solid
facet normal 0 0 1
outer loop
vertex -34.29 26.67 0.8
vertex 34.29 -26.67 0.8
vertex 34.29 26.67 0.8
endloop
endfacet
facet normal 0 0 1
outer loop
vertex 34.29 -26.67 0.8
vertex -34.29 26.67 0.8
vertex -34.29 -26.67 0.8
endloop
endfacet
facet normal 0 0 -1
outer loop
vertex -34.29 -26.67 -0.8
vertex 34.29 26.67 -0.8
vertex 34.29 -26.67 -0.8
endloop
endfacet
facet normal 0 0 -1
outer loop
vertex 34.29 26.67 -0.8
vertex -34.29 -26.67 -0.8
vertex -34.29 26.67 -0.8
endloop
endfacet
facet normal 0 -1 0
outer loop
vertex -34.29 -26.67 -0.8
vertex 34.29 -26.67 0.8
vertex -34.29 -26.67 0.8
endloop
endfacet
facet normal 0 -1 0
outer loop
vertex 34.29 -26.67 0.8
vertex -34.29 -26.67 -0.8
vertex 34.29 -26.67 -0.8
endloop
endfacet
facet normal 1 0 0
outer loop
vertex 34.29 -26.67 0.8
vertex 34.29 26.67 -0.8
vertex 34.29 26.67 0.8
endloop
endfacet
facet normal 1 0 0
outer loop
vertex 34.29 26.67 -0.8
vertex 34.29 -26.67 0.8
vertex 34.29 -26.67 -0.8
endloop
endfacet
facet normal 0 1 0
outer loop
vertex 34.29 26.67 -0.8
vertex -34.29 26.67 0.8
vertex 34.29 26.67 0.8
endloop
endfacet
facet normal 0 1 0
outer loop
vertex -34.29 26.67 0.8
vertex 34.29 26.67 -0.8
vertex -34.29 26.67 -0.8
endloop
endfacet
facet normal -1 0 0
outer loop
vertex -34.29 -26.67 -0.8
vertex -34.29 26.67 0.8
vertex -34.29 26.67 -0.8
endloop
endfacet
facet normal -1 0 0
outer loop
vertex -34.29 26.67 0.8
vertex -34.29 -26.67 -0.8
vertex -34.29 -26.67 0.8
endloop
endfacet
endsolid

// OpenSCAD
// Parameters
pcb_length = 68.58; //[34.29:137.16:0.01]
pcb_width = 53.34; //[26.67:106.68:0.01]
pcb_thickness = 1.6; //[0.8:3.2:0.1]

// Main PCB Body
module pcb_main_body() {
  color([0.0, 0.4, 0.2]) // Green color for PCB
  cube([pcb_length, pcb_width, pcb_thickness], center=true);
}

// Mounting Holes (Placeholder)
module mounting_holes() {
  // No actual holes defined, placeholder for future implementation
}

// Edge Rounding (Placeholder)
module edge_rounding() {
  // No actual rounding defined, placeholder for future implementation
}

// Silkscreen Markings (Placeholder)
module silkscreen_markings() {
  // No actual markings defined, placeholder for future implementation
}

// Connectors and Headers (Placeholder)
module connectors_headers() {
  // No actual connectors defined, placeholder for future implementation
}

// IC Packages (Placeholder)
module ic_packages() {
  // No actual ICs defined, placeholder for future implementation
}

// LEDs and Buttons (Placeholder)
module leds_buttons() {
  // No actual LEDs or buttons defined, placeholder for future implementation
}

// Complete Board
module board_complete() {
  union() {
    pcb_main_body();
    mounting_holes();
    edge_rounding();
    silkscreen_markings();
    connectors_headers();
    ic_packages();
    leds_buttons();
  }
}

// Final Output
board_complete();
